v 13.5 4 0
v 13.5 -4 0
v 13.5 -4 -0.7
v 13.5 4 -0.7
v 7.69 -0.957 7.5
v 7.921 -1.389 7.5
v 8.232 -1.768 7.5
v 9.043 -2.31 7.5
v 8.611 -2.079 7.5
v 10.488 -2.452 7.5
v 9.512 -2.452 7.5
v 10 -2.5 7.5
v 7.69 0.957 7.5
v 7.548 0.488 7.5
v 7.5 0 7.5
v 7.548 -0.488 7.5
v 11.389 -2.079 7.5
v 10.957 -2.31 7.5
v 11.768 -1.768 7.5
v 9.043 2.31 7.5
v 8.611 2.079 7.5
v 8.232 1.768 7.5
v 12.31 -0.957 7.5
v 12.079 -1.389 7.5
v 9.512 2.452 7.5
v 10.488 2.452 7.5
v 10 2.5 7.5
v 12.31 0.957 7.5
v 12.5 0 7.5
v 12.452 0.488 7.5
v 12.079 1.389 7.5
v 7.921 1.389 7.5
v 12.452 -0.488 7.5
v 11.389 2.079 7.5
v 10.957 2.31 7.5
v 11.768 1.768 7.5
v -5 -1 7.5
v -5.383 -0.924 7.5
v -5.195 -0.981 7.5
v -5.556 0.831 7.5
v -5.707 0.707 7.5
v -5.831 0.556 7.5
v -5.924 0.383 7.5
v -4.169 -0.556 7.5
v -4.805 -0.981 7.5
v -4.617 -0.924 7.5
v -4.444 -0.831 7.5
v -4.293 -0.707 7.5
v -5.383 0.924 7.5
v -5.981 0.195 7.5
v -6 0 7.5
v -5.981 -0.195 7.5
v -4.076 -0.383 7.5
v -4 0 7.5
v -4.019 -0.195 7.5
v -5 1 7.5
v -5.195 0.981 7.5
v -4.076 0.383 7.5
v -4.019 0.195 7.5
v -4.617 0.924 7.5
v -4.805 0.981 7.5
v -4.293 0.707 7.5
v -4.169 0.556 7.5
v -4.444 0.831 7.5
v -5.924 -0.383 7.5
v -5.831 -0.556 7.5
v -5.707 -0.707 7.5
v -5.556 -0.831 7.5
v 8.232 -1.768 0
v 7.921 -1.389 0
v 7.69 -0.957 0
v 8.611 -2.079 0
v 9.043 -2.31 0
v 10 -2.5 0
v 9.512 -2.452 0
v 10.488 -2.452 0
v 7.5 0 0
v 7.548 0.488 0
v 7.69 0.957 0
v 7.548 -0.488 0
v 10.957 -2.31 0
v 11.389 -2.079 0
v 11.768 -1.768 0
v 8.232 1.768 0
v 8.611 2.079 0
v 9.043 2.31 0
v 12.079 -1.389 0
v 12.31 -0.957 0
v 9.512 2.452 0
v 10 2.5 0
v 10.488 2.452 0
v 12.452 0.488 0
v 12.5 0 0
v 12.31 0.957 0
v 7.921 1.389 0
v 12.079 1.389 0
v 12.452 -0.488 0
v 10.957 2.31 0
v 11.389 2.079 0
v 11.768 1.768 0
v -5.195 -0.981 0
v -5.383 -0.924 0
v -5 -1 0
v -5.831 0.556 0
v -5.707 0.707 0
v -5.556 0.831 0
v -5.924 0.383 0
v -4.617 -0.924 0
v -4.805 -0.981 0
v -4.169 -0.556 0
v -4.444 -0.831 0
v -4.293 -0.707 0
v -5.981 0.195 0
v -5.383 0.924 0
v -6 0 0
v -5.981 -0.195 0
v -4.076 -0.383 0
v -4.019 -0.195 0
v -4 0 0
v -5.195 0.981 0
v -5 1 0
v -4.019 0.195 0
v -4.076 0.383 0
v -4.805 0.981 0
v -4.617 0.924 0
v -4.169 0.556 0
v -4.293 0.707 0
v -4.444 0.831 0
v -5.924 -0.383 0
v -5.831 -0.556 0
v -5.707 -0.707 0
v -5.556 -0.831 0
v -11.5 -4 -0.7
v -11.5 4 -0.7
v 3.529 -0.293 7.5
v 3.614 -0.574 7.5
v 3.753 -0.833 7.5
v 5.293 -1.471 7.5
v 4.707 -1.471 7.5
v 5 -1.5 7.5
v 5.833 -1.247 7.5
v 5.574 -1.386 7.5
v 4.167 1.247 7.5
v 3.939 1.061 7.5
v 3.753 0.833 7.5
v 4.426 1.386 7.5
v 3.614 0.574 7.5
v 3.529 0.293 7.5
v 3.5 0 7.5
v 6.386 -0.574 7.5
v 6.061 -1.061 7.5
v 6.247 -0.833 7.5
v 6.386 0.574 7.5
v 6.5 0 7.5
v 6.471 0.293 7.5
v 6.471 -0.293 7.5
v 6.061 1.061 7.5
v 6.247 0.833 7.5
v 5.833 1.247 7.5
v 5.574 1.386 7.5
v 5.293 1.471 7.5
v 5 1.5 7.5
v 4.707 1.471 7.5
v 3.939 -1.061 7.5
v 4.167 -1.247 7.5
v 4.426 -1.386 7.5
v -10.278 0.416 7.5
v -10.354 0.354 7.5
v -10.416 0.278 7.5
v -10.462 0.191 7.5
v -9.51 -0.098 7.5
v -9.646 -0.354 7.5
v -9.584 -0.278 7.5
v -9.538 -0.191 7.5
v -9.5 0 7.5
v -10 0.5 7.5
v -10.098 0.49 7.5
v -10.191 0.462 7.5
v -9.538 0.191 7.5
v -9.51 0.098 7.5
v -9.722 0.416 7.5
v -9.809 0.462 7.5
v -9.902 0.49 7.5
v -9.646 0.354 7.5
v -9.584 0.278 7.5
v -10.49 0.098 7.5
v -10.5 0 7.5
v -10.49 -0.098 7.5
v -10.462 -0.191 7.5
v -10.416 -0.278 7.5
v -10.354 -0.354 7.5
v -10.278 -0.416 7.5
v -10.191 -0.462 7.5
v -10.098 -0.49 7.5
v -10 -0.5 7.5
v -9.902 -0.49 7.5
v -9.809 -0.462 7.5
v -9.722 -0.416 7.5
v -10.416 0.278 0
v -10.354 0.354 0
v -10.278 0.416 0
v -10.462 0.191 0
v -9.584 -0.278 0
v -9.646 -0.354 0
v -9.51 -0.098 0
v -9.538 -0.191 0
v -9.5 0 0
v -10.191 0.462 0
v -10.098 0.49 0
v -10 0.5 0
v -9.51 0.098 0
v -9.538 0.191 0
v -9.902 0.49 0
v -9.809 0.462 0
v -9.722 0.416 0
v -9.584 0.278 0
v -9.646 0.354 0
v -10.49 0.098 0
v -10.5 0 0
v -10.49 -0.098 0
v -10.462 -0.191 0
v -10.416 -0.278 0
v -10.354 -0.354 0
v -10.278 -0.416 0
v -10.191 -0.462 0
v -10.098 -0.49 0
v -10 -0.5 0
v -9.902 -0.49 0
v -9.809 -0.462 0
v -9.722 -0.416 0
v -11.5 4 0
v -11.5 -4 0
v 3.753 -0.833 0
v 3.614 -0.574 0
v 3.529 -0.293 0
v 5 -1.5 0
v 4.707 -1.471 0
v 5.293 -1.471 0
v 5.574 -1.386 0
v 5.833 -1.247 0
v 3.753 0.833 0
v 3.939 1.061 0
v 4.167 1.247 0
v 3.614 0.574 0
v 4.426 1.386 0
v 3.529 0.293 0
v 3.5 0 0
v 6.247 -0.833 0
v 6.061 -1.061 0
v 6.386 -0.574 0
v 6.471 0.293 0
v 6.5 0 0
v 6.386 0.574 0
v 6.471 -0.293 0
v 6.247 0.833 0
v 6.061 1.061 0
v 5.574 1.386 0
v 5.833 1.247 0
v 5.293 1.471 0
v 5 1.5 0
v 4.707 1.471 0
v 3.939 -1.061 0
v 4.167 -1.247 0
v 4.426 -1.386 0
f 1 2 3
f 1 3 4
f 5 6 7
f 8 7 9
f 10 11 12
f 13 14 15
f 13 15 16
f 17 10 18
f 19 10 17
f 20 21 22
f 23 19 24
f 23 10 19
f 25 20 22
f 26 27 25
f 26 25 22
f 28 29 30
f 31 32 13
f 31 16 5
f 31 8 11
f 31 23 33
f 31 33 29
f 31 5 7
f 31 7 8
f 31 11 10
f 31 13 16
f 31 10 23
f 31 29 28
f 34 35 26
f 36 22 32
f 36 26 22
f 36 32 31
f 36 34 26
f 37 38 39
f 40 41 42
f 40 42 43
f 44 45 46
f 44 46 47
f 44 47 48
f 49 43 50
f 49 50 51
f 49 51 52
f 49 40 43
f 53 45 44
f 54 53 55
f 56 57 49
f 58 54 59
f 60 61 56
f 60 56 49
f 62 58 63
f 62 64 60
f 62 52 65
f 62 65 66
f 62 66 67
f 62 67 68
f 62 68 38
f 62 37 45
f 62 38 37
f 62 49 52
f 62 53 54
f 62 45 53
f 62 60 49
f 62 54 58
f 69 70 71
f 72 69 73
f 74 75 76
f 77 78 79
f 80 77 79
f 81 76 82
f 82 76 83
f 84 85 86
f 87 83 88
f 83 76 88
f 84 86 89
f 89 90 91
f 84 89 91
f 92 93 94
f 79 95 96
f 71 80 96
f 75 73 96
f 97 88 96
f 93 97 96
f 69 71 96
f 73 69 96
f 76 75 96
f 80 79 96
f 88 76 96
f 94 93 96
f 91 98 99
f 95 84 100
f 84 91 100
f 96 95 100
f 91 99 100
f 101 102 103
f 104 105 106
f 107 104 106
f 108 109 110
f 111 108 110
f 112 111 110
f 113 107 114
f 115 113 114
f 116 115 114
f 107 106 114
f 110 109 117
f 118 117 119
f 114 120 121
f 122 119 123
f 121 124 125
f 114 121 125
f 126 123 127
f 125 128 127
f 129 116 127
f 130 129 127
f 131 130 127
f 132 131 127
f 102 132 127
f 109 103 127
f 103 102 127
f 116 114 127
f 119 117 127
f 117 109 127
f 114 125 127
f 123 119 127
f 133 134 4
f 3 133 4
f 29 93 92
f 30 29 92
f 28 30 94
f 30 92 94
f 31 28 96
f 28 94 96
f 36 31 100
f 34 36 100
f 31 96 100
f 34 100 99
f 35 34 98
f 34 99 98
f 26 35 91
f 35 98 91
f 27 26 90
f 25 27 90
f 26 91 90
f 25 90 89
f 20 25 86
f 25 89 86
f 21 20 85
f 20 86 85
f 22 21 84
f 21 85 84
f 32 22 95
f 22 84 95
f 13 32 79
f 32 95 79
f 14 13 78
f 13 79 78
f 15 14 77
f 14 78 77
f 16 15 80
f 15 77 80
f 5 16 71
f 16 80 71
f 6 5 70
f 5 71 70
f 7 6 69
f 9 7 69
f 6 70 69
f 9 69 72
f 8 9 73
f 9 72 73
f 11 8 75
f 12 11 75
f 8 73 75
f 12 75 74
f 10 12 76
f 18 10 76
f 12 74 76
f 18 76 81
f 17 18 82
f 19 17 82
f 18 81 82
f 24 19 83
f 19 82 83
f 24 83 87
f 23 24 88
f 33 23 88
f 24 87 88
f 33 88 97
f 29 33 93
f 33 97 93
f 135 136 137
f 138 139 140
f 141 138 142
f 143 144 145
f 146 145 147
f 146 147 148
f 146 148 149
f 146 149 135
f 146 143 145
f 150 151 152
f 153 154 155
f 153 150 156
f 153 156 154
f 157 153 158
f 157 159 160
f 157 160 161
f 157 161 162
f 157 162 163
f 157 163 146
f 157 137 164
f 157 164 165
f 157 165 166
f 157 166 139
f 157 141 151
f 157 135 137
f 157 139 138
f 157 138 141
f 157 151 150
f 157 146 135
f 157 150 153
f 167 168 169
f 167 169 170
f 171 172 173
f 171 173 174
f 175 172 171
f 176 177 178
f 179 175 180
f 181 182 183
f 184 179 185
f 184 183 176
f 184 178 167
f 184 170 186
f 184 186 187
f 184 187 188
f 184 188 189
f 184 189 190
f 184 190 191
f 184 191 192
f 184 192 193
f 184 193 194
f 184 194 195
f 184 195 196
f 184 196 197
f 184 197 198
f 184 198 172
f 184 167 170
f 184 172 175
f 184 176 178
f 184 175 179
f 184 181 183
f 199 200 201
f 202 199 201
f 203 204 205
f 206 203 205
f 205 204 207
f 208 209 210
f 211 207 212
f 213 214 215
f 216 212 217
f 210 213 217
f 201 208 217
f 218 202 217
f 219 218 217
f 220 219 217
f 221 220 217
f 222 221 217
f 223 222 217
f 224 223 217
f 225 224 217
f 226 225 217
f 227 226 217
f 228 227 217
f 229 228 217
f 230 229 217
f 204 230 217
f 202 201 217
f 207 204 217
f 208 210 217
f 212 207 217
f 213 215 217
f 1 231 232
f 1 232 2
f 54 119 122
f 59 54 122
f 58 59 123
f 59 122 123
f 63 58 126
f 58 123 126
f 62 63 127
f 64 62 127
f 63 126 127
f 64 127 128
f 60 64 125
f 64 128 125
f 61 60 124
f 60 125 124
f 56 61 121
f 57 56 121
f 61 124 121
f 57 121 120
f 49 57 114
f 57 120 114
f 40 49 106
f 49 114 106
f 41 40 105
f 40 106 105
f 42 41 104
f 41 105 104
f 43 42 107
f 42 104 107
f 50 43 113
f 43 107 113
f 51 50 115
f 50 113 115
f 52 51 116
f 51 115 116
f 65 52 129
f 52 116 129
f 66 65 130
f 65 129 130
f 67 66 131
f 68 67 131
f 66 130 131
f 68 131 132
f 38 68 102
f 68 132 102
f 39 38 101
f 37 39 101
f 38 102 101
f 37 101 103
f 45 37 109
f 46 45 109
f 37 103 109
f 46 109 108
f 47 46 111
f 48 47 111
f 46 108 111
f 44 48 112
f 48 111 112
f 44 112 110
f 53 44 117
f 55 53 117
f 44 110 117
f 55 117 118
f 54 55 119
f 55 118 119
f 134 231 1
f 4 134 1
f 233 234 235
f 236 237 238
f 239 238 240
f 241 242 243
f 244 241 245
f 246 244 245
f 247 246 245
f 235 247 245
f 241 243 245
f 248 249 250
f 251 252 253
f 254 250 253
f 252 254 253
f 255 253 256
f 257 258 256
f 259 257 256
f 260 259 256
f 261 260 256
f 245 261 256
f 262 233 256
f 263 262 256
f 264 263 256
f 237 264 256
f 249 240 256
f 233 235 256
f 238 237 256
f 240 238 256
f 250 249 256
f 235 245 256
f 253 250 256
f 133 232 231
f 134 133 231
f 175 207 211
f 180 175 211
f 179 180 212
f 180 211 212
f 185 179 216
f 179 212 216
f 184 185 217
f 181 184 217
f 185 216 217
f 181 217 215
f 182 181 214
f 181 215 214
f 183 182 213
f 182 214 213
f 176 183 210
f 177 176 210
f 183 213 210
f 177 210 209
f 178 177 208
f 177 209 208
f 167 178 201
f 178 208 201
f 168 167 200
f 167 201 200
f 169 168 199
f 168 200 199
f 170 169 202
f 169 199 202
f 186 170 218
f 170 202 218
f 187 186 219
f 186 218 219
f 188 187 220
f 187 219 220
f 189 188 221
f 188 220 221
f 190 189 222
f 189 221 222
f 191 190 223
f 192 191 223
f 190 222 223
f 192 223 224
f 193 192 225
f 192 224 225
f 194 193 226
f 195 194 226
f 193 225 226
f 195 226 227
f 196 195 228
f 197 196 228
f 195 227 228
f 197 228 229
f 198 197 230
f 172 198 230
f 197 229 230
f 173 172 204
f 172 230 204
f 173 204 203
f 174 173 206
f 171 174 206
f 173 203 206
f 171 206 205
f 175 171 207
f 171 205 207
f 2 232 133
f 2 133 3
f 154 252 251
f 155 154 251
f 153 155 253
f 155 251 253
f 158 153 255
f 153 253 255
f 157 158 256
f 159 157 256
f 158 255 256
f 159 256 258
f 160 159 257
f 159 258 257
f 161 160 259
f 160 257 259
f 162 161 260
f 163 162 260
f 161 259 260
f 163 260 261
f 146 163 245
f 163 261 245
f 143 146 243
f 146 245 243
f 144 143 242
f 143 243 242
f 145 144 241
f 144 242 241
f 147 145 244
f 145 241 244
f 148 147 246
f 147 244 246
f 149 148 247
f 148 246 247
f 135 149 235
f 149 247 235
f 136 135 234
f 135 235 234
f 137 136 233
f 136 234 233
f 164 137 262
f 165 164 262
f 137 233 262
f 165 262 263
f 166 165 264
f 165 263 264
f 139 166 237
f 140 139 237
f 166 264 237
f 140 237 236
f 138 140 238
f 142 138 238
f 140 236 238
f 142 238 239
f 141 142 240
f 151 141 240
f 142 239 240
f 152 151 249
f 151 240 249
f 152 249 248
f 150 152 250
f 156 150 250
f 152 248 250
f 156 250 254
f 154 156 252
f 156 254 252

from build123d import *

# Parameters (mm, degrees)
F0_R     = 1
F0_R_2   = 1.5
F0_R_3   = 0.5
F0_R_4   = 2.5
F1_DEPTH = 7.5
F2_W     = 25
F2_H     = 8
F3_DEPTH = 0.7


with BuildPart() as f1:
    # F0 (on Top) → F1 (new body)
    with BuildSketch(Plane.XY):
        with Locations((-5, 0)):
            Circle(F0_R)
        with Locations((5, 0)):
            Circle(F0_R_2)
        with Locations((-10, 0)):
            Circle(F0_R_3)
        with Locations((10, 0)):
            Circle(F0_R_4)
    extrude(amount=F1_DEPTH)


with BuildPart() as f3:
    # F2 (on Top) → F3 (new body)
    with BuildSketch(Plane.XY):
        with Locations((1, 0)):
            Rectangle(F2_W, F2_H)
    extrude(amount=-F3_DEPTH)


solid = Compound([f1.part, f3.part])
